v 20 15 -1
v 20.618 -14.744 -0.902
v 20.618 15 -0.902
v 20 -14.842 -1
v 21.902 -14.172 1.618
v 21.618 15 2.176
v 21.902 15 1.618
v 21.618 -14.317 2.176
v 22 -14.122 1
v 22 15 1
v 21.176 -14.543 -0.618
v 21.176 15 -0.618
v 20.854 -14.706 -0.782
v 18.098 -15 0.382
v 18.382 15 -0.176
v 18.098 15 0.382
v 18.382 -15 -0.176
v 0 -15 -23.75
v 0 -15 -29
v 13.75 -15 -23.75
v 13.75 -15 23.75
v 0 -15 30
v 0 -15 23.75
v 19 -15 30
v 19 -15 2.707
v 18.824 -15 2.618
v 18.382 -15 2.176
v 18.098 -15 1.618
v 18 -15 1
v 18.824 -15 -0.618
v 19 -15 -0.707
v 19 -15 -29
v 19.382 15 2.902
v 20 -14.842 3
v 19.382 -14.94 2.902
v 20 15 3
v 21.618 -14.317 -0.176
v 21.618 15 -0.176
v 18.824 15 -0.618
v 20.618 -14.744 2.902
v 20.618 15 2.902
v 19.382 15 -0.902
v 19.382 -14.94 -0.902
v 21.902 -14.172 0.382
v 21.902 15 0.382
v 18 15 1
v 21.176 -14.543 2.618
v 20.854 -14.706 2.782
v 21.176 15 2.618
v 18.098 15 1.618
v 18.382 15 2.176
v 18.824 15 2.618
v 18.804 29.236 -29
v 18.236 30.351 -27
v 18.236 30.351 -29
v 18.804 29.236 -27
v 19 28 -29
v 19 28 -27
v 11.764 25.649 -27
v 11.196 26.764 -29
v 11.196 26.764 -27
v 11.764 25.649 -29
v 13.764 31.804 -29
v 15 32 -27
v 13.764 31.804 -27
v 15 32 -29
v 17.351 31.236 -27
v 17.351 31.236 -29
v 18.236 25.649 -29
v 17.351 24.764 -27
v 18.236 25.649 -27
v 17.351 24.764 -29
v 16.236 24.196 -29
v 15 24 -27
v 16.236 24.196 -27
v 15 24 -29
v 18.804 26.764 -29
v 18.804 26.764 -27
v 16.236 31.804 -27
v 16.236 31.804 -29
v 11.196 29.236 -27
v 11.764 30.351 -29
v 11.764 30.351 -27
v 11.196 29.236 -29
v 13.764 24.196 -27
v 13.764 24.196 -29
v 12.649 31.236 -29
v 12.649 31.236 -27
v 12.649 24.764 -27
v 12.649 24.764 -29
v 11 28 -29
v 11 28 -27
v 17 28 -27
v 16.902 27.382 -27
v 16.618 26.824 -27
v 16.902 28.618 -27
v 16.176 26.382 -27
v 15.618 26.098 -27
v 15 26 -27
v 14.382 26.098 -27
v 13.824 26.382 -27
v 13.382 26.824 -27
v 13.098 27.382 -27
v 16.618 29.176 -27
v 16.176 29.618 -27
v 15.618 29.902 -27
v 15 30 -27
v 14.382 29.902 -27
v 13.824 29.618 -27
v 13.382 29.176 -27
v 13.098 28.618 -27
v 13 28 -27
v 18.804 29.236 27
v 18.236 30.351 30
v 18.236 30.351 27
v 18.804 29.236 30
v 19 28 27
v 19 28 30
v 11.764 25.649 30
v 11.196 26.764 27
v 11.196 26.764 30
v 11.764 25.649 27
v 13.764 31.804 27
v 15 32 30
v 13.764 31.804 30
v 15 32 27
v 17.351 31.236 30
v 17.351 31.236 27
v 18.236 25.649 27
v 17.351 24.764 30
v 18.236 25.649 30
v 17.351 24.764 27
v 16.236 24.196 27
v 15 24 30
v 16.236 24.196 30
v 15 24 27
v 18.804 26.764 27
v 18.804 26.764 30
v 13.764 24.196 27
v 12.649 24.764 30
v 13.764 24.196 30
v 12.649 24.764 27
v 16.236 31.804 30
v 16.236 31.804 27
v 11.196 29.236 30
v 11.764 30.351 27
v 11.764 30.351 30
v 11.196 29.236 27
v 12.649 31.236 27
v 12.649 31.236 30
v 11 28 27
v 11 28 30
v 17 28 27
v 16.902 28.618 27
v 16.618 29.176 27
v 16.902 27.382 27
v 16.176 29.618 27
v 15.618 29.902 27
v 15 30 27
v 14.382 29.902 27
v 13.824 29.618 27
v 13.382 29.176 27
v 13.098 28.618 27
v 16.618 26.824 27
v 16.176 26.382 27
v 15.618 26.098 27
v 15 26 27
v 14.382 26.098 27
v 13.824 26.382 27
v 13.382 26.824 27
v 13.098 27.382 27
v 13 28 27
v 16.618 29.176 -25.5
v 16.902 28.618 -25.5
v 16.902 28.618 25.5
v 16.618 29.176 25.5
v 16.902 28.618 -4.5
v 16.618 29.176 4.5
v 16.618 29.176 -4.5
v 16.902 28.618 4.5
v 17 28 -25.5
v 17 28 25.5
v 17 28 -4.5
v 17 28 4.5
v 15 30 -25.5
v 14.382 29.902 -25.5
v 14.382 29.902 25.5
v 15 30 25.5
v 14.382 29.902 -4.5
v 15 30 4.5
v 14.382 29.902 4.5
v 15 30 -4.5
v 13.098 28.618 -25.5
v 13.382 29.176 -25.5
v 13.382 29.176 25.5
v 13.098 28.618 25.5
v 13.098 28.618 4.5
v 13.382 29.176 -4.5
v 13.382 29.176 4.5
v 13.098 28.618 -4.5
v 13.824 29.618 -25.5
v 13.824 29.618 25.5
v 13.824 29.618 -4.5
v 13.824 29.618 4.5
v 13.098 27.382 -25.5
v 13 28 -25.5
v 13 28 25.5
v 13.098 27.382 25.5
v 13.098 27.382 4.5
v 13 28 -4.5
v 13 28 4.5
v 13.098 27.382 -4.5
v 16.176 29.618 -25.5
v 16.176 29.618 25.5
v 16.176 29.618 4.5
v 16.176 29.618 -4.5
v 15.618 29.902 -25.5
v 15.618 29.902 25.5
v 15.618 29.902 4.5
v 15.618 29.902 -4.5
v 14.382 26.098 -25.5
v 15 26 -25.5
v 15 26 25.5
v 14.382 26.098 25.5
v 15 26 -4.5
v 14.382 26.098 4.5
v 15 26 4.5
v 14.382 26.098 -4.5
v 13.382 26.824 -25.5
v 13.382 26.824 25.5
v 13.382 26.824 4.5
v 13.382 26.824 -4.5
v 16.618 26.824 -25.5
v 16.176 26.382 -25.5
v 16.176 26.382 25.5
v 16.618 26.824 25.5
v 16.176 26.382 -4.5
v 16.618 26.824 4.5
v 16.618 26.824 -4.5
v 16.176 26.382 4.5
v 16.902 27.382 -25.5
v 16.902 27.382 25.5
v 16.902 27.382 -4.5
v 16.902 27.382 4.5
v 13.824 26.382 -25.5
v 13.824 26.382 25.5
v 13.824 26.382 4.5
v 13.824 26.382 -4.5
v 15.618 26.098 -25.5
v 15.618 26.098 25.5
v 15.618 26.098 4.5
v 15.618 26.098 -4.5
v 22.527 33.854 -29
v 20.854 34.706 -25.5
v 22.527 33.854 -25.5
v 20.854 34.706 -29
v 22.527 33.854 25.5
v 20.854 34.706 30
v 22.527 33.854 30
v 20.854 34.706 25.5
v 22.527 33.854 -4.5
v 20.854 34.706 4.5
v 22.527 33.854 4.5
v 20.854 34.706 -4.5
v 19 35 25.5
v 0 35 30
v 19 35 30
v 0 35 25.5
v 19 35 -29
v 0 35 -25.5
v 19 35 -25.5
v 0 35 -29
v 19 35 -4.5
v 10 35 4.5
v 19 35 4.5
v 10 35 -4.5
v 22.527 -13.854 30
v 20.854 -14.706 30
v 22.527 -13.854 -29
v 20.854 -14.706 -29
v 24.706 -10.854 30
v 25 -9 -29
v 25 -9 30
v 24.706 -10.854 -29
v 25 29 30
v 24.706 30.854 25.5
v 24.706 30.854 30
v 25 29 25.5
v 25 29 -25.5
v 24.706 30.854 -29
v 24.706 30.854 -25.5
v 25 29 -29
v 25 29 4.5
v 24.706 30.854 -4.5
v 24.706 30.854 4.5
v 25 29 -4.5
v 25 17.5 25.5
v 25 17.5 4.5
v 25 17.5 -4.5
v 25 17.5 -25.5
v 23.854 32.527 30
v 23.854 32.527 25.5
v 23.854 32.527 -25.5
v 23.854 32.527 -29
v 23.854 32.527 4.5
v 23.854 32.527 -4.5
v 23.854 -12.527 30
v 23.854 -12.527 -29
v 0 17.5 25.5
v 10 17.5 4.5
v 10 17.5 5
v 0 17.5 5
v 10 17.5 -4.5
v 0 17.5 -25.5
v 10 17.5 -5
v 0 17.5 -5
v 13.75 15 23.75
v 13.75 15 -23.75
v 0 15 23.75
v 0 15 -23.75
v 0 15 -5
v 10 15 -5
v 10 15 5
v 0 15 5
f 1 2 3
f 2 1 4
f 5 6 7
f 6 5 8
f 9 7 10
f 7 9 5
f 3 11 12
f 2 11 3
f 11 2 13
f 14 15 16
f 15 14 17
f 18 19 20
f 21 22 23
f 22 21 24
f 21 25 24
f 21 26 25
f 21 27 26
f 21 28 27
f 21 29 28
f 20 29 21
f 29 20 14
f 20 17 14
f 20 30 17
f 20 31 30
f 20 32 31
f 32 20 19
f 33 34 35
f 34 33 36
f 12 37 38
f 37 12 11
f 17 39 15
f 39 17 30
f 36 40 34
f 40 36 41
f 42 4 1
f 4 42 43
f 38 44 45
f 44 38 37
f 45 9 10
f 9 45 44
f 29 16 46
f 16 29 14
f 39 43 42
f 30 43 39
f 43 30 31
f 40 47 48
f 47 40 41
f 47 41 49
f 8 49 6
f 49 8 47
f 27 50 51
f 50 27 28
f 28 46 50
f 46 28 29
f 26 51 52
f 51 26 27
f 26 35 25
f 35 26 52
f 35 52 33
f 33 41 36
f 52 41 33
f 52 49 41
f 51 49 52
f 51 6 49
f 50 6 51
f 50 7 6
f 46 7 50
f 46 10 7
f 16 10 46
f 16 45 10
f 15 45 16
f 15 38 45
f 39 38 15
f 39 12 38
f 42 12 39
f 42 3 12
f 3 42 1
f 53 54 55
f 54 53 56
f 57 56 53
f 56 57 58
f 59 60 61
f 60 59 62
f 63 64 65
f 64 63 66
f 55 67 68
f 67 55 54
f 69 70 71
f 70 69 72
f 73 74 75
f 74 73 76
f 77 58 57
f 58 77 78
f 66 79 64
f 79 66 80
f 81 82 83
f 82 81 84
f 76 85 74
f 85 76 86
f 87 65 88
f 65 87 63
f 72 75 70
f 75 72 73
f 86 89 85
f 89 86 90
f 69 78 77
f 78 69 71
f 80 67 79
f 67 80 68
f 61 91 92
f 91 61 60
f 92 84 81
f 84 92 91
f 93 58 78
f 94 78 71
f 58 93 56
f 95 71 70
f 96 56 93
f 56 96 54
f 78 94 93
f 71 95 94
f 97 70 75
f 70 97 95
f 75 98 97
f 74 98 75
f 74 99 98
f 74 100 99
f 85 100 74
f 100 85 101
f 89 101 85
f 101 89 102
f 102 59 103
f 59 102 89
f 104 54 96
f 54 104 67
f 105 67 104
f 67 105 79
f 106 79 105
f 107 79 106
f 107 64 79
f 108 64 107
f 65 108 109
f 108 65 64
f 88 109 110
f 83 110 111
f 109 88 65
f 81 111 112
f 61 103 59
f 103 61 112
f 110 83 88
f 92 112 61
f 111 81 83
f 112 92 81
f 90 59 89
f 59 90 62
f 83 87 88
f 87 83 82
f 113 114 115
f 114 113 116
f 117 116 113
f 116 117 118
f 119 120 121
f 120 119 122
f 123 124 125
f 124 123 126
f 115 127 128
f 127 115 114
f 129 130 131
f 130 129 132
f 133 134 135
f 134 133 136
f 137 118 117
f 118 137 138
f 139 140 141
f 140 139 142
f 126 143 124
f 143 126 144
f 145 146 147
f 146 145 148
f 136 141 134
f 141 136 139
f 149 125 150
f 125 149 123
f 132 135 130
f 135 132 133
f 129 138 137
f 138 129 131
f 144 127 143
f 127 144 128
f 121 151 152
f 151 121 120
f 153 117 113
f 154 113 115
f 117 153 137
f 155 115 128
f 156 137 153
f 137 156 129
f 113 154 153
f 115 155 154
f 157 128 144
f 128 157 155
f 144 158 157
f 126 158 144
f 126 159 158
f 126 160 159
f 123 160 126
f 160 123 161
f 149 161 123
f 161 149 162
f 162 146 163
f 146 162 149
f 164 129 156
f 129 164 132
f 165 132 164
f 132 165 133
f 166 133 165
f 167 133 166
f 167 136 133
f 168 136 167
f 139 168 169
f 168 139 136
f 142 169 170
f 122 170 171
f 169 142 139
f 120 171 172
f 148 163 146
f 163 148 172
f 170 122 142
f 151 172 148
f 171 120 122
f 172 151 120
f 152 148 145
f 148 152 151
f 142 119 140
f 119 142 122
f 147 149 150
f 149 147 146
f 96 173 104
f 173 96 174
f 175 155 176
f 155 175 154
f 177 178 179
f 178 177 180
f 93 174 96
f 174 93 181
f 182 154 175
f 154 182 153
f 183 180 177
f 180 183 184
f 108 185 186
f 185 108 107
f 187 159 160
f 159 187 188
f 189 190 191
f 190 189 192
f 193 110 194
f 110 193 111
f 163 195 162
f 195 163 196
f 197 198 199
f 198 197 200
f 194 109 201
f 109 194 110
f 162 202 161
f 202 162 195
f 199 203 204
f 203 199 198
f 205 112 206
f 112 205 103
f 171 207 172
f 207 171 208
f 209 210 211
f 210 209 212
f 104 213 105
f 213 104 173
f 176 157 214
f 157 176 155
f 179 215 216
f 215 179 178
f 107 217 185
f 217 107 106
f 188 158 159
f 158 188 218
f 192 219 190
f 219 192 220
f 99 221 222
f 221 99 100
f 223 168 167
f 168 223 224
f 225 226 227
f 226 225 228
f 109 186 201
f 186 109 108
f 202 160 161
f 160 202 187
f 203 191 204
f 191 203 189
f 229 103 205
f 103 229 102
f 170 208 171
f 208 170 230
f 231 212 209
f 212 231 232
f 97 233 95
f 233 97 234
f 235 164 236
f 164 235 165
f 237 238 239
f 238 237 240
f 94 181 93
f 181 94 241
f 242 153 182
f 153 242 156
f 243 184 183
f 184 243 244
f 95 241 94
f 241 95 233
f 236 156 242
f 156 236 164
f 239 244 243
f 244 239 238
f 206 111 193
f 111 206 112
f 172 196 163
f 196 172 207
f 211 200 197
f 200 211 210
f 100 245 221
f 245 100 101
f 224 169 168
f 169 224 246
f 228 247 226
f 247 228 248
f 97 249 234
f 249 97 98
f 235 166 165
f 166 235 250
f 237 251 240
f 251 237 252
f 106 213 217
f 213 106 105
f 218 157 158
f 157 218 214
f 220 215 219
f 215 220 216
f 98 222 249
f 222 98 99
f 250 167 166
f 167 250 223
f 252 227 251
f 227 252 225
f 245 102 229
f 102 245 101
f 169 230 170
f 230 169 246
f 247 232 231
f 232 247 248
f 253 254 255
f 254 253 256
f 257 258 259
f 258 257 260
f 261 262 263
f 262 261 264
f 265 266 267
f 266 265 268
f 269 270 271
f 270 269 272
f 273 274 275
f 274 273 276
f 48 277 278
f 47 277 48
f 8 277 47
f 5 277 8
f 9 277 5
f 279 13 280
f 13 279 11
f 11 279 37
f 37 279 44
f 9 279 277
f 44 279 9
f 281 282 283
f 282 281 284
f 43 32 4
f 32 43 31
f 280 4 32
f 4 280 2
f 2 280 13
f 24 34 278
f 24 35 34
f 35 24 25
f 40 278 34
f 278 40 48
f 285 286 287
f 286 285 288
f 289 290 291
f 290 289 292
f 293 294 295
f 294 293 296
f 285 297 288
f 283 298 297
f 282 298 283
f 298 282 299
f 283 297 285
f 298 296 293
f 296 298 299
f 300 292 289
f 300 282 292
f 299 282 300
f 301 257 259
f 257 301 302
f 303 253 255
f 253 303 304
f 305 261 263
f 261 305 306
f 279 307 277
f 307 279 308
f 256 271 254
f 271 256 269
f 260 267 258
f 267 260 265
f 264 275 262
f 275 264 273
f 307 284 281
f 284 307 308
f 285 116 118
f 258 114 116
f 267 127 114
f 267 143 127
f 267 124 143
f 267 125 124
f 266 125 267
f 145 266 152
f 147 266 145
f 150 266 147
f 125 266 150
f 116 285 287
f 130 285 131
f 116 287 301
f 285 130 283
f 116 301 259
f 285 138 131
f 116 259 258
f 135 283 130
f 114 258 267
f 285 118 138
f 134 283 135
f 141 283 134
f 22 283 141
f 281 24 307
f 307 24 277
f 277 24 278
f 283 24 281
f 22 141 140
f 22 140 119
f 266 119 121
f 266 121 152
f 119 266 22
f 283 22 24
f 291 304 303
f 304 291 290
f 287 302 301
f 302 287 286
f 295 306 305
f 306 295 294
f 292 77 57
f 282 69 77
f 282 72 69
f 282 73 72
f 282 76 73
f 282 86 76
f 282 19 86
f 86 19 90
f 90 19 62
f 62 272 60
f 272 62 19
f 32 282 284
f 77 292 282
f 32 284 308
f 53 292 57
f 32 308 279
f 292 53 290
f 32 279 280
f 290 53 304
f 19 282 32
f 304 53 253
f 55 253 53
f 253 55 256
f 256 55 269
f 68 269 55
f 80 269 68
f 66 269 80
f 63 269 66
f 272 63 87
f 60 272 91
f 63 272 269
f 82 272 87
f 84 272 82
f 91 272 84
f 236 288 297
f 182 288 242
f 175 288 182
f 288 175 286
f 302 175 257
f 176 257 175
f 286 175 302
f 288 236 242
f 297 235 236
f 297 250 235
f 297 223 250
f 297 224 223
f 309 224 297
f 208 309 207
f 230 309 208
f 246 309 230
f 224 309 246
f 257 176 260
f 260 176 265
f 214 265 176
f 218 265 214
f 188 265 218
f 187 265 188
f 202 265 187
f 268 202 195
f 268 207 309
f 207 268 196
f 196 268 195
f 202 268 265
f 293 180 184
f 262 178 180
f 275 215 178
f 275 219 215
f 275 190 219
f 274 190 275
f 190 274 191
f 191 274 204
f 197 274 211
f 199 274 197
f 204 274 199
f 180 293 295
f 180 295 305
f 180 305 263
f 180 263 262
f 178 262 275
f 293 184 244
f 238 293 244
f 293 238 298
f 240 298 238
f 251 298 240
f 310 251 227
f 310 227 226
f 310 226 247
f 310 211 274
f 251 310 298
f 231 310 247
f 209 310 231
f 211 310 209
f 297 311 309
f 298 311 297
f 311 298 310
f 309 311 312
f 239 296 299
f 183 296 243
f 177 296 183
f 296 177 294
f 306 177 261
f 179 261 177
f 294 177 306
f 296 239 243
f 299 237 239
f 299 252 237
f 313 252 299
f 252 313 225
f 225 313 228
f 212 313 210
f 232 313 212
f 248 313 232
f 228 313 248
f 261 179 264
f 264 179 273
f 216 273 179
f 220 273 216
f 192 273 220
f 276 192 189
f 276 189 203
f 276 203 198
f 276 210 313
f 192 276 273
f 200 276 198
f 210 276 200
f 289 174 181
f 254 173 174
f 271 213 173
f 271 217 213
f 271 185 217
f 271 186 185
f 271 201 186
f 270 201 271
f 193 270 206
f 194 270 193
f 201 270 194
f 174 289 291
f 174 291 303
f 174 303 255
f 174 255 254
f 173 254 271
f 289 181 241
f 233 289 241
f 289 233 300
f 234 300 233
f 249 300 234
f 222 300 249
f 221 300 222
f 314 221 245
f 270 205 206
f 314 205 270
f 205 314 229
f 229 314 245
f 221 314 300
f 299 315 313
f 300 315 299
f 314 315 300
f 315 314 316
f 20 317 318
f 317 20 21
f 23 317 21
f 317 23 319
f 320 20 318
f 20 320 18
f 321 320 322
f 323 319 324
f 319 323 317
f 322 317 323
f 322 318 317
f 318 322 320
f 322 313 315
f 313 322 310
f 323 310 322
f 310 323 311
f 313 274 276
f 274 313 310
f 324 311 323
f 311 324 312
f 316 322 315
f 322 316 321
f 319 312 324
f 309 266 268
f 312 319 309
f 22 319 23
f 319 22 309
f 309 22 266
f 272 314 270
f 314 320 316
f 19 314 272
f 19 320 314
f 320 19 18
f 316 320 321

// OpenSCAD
extrusion=20+1;
roundness=6;

m4ScrewRadius=2;
m4ScrewHeadRadius=4;
//draw two extrusion
//%translate([0,32,15])cube([100,extrusion,extrusion],center=true);
//%translate([0,32,-15]) cube([100,extrusion,extrusion],center=true);

module powerBox(){
    difference(){
	// main part
	translate([0,10,0])
	minkowski(){
	    cube([50-roundness*2,50-roundness*2,58],center=true);
	    cylinder(r=roundness,h=1,$fn=20);
	}

	// aluminum mount
	translate([0,28,15])cube([100,extrusion,extrusion],center=true);
	translate([0,28,-15]) cube([100,extrusion,extrusion],center=true);

	// empty inside:
	translate([0,0,0])cube([27.5,30,47.5],center=true);

	//L, N, ground lines pass
	cube([20,100,10],center=true);

	// switch mount screws
	for(x=[20,-20])translate([x,0,1])rotate([90,0,0])cylinder(r=m4ScrewRadius,h=30,center=true,$fn=20);

	// for m4 at bottom and top
	for(x=[-15,15]){translate([x,28,0])cylinder(r=m4ScrewRadius,h=100,center=true,$fn=20);
	for(z=[-32,32])translate([x,28,z])cylinder(r=m4ScrewHeadRadius,h=10,center=true,$fn=20);}
    }

    
}

module powerBoxRight(){
    intersection(){
	powerBox();
	translate([20,0,0])cube([40,100,100],center=true);
    }
}

module powerBoxLeft(){
    intersection(){
	powerBox();
	translate([-20,0,0])cube([40,100,100],center=true);
    }
}



//powerBoxLeft();
powerBoxRight();
